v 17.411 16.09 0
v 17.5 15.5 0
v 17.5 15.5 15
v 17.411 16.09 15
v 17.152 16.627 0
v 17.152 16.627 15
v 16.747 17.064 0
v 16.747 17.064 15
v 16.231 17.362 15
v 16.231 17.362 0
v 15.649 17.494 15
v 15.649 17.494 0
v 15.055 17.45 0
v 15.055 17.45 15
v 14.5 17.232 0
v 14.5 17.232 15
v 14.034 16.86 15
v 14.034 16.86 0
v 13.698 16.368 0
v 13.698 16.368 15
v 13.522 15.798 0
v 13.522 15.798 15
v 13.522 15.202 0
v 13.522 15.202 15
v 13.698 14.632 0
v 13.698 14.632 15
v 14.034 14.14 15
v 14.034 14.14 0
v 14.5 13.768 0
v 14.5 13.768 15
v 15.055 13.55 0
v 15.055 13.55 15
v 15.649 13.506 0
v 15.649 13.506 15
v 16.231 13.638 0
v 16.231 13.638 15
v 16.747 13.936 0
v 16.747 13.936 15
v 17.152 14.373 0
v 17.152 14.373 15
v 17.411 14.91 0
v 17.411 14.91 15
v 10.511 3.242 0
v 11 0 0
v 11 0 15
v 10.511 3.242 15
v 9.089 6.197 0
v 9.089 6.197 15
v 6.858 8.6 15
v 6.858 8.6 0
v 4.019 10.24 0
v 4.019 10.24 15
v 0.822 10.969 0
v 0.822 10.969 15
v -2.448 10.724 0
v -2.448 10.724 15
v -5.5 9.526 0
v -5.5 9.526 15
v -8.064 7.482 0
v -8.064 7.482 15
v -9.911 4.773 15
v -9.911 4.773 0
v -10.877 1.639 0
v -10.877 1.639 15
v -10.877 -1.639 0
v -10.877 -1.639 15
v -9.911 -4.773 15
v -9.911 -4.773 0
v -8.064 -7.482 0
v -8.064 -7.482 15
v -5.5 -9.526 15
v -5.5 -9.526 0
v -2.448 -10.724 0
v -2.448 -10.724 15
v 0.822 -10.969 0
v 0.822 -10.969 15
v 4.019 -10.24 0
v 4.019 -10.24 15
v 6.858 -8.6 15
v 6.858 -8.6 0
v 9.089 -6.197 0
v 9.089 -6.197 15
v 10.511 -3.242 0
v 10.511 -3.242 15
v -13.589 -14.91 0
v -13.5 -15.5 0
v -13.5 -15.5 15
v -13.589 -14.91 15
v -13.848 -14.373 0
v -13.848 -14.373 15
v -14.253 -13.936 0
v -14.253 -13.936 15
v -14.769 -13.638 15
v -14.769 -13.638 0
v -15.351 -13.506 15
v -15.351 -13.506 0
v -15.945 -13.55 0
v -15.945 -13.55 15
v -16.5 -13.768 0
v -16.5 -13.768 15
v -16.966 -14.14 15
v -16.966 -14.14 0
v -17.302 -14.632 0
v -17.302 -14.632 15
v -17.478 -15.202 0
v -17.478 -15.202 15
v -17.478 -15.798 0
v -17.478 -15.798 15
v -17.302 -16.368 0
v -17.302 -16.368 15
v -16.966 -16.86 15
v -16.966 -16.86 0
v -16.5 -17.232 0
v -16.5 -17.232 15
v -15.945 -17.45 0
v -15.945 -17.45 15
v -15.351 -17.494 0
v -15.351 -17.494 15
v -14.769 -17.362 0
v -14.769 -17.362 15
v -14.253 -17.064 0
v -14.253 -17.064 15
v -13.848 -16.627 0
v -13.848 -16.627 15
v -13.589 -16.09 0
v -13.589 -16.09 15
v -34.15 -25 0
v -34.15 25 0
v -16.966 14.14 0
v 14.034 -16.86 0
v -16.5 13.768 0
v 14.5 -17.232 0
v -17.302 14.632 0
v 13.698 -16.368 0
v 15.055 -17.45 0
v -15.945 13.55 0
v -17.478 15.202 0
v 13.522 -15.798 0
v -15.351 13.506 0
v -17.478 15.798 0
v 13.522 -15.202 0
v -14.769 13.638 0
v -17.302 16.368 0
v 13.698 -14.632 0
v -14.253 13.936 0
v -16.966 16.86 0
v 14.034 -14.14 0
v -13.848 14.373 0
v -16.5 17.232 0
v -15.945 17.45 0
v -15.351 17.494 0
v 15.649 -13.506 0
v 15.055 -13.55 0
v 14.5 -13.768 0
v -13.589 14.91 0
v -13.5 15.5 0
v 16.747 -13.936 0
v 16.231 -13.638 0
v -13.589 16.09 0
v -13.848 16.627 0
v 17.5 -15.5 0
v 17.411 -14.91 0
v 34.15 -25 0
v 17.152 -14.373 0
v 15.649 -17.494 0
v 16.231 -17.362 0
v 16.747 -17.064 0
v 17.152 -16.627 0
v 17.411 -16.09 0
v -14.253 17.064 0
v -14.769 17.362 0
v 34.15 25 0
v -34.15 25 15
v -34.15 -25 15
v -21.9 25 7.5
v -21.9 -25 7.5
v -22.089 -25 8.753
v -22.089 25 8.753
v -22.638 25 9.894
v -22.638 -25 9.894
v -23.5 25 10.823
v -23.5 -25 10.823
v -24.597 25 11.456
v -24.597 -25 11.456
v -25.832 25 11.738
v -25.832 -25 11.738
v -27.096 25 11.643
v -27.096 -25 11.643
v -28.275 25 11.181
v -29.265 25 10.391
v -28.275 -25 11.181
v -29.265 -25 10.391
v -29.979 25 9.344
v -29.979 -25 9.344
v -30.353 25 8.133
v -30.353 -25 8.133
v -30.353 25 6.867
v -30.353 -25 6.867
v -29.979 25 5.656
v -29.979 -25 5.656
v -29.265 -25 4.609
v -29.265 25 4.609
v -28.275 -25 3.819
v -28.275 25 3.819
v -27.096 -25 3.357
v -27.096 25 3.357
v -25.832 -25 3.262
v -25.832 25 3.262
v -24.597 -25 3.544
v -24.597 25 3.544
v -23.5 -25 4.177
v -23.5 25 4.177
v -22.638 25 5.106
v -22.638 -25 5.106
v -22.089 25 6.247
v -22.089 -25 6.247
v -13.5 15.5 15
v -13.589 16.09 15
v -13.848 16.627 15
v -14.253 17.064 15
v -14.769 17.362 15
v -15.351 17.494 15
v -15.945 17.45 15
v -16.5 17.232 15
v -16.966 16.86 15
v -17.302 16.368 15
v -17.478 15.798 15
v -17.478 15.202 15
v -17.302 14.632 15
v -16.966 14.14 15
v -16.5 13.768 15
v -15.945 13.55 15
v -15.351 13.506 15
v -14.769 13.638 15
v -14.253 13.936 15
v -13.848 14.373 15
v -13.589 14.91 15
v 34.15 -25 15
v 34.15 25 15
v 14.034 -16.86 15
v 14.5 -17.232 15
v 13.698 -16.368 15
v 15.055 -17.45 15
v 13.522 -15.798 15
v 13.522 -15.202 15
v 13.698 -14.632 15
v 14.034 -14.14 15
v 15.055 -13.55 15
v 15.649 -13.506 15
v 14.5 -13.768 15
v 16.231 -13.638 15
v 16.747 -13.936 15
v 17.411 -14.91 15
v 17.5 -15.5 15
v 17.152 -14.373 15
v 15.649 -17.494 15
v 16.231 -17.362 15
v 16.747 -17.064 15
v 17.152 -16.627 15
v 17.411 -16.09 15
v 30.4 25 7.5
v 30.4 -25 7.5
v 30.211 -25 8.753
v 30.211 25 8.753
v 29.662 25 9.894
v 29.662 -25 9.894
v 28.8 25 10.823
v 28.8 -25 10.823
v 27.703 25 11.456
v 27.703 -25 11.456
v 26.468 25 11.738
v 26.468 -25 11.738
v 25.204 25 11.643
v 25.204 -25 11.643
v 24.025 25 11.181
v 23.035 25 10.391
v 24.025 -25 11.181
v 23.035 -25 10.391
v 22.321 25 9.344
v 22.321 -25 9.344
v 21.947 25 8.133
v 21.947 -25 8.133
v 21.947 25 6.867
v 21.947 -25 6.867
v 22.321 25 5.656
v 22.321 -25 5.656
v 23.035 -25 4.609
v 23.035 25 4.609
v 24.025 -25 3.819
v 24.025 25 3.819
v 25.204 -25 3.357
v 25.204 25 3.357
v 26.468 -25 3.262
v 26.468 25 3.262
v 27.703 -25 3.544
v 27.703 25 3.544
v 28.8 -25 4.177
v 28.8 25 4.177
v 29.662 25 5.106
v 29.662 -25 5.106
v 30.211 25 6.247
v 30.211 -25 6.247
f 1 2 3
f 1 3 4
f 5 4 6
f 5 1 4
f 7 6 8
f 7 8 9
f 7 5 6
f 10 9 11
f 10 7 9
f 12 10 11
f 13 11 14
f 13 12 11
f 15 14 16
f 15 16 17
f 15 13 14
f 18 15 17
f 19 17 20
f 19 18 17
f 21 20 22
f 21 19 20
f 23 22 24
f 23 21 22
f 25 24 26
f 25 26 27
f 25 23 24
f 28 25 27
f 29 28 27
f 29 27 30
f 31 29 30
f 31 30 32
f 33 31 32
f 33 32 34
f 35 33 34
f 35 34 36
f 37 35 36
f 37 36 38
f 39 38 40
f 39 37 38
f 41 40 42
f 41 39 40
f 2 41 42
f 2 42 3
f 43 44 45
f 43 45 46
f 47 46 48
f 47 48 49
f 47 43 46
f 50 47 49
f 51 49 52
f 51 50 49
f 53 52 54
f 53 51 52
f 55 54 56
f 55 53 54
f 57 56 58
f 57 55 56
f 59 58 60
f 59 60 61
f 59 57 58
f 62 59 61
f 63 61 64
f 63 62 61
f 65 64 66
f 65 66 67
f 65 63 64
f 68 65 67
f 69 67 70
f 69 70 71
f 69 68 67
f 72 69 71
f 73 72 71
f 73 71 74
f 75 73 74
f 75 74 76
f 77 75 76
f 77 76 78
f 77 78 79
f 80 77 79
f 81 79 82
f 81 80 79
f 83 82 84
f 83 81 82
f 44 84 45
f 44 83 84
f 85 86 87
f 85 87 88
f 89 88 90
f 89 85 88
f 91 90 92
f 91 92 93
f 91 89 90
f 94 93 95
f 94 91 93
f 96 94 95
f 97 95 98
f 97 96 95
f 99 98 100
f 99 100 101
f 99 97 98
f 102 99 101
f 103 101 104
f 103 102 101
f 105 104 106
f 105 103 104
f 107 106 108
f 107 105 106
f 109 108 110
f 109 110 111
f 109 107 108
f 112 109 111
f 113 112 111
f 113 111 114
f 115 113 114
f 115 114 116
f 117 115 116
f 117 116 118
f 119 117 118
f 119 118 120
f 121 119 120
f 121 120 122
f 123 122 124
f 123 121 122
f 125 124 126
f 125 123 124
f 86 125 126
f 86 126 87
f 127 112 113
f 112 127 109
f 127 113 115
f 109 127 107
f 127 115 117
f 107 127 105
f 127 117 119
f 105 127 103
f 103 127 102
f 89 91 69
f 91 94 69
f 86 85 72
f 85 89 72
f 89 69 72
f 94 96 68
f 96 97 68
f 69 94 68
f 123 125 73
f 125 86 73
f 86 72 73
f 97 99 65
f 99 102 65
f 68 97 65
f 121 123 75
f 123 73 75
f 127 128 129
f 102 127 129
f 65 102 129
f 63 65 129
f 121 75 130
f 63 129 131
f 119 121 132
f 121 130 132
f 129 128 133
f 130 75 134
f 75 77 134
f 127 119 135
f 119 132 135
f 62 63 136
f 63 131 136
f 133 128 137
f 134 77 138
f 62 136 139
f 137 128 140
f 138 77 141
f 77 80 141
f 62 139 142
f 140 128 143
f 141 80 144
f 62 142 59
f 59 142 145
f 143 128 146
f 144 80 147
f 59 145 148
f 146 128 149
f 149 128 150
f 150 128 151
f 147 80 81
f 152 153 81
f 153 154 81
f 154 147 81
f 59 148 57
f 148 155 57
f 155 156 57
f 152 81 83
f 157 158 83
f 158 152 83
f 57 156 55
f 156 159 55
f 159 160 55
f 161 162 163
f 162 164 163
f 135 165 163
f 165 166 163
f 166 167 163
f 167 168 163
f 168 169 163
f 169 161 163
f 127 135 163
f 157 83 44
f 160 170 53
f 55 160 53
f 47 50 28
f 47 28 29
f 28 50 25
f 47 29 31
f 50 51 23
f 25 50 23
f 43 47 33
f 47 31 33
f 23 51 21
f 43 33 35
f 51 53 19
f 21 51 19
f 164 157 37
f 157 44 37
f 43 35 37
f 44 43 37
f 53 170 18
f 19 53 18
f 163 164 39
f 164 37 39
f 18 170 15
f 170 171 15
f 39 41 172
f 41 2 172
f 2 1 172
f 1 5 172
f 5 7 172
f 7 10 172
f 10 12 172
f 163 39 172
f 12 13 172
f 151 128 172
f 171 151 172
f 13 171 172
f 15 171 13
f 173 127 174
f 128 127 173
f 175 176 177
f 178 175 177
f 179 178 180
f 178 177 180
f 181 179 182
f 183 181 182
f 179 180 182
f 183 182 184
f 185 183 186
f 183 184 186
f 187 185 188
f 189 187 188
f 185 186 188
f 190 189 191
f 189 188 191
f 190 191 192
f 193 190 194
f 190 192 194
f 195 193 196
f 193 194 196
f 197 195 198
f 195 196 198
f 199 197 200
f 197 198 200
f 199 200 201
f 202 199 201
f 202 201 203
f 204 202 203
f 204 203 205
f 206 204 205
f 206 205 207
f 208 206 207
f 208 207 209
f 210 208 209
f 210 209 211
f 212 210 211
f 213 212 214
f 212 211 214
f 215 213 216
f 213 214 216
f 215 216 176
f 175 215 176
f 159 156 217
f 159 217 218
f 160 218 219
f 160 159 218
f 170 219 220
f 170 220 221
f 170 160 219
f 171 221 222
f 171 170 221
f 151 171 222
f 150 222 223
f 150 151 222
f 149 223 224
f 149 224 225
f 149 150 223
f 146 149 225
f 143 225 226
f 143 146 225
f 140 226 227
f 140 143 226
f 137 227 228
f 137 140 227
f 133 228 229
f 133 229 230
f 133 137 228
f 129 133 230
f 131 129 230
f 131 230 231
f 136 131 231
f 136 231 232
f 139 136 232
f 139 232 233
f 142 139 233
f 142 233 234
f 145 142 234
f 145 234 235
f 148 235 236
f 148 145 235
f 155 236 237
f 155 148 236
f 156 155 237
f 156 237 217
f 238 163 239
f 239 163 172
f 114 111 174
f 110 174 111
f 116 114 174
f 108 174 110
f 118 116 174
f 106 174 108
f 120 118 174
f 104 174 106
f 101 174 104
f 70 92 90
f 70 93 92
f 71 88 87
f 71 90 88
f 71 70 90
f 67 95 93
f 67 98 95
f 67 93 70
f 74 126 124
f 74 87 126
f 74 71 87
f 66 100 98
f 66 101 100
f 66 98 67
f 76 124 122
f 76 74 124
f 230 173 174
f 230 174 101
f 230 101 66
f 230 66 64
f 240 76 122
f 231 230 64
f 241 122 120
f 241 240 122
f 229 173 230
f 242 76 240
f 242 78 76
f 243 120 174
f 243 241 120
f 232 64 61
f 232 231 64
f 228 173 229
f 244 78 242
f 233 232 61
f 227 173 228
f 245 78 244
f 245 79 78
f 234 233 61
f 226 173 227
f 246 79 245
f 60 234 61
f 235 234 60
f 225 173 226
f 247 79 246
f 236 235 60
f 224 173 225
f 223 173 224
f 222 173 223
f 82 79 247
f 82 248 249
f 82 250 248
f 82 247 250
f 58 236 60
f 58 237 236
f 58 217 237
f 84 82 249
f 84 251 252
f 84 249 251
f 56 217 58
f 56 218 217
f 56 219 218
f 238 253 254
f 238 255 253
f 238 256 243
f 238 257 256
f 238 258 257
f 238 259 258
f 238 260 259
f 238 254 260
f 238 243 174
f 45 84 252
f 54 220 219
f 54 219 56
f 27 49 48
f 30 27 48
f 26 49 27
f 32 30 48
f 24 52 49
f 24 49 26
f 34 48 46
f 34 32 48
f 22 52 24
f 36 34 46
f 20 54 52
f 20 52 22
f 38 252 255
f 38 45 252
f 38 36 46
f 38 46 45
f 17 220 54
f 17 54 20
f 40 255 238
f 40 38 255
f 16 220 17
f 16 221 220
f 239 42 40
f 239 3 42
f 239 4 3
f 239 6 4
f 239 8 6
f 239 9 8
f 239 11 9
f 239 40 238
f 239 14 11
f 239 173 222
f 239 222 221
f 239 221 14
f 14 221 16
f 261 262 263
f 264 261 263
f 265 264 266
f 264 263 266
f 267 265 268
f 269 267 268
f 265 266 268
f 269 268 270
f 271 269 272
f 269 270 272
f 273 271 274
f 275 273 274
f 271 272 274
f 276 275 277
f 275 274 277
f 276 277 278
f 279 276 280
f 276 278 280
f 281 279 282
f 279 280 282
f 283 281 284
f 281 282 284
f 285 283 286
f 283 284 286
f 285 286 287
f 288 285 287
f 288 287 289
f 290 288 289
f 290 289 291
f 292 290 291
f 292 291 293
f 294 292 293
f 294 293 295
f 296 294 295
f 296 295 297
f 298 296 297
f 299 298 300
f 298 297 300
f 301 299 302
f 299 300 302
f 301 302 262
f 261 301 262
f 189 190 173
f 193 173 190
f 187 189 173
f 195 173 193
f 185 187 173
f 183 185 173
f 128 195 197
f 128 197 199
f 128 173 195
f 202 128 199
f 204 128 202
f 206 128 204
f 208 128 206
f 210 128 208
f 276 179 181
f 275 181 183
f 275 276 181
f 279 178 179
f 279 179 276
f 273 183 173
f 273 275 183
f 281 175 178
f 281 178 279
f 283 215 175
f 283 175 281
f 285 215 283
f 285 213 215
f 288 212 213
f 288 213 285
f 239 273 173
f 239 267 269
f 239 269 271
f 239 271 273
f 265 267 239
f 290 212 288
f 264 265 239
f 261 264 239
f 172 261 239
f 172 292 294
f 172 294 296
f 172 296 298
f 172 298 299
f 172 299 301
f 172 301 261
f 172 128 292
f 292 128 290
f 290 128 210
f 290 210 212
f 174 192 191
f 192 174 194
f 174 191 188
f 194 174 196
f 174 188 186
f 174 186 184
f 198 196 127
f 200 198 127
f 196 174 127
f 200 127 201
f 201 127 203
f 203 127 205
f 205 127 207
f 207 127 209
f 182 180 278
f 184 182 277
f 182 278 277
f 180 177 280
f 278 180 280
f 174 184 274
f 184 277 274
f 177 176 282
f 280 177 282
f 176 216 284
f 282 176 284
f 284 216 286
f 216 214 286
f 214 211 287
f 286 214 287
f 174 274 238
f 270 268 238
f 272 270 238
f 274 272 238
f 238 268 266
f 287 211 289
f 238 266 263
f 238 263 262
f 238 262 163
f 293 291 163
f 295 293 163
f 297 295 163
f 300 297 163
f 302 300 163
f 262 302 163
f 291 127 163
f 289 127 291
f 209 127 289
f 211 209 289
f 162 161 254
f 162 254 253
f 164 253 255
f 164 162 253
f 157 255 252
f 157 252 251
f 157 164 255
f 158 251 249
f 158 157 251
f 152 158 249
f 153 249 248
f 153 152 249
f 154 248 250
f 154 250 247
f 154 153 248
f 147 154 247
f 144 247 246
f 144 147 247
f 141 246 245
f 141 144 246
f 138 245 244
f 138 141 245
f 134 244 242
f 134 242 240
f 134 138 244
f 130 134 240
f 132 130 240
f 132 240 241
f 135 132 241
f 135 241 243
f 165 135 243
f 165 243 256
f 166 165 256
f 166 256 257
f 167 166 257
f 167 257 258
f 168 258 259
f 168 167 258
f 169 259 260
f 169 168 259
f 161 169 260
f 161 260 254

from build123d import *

# Parameters (mm, degrees)
F0_W     = 68.3
F0_H     = 50
F0_R     = 2
F0_R_2   = 11
F1_DEPTH = 15
F2_R     = 4.25
F3_DEPTH = 50


with BuildPart() as f1:
    # F0 (on Top) → F1 (new body)
    with BuildSketch(Plane.XY):
        Rectangle(F0_W, F0_H)
        with Locations((-15.5, -15.5)):
            Circle(F0_R, mode=Mode.SUBTRACT)
        with Locations((15.5, -15.5)):
            Circle(F0_R, mode=Mode.SUBTRACT)
        with Locations((-15.5, 15.5)):
            Circle(F0_R, mode=Mode.SUBTRACT)
        Circle(F0_R_2, mode=Mode.SUBTRACT)
        with Locations((15.5, 15.5)):
            Circle(F0_R, mode=Mode.SUBTRACT)
    extrude(amount=F1_DEPTH)

    # F2 (on face) → F3 (cut, through all)
    with BuildSketch(Plane.XZ.offset(25)):
        with Locations((-26.15, 7.5)):
            Circle(F2_R)
        with Locations((26.15, 7.5)):
            Circle(F2_R)
    extrude(amount=-F3_DEPTH, mode=Mode.SUBTRACT)


solid = f1.part
